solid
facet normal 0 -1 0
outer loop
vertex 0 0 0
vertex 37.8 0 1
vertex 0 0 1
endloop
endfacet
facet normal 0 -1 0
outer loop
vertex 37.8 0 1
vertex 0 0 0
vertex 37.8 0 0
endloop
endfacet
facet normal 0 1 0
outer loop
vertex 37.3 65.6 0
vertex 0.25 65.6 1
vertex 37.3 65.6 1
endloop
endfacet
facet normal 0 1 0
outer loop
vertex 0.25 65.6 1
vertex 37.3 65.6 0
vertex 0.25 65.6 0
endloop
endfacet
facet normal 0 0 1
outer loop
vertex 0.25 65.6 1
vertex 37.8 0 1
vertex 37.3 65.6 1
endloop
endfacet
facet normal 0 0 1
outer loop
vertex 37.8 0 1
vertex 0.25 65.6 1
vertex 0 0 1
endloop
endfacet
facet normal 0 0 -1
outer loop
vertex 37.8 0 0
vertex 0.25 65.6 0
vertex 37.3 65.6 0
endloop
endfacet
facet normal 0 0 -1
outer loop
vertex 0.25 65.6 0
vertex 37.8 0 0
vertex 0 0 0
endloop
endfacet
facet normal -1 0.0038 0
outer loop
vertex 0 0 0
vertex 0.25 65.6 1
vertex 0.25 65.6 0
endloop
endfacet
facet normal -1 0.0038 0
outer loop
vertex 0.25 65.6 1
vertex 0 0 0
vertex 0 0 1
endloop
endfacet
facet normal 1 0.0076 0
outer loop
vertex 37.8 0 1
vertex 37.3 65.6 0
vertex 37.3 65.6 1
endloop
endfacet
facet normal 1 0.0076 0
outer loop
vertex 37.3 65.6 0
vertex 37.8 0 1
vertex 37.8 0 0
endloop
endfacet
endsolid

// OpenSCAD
//cube([37.3, 65.5, 1]);

y  = 65.6;
z  = 1;
x = 37.3;

delta = 0.25;

pnts = [
           [0, 0, 0],
           [0, 0, z],
           [x+(2*delta), 0, z],
           [x+(2*delta), 0, 0],
           [0+delta, y, 0],
           [0+delta, y, z],
           [x, y, z],
           [x, y, 0]
         ];
         
fcs = [
          [0, 1, 2, 3], // bottom
          [7, 6, 5, 4], // top
          [1, 5, 6, 2], // front
          [0, 3, 7, 4], // back
          [0, 4, 5, 1], // left
          [3, 2, 6, 7]  // right
          ];
          
         
polyhedron(points = pnts,
           faces = fcs);
